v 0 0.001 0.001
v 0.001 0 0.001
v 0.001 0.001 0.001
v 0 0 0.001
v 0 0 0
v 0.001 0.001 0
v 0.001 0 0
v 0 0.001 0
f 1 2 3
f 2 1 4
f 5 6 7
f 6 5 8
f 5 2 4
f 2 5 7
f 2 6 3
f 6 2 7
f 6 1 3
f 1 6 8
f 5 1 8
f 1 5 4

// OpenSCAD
// t_net — the network layer, as PURE DATA. Nothing here renders, and none of it
// depends on $fa/$fs. This is the tier that catches what "Simple: yes" cannot,
// and every silent failure this design was reviewed against passed "Simple: yes".

// clang-format off
use <../src/uniTube.scad>;
// clang-format on

$fa = 12;
$fs = 2;

prof = ut_round(od = 12, id = 8);
big = ut_round(od = 20, wall = 2);

// ============================================ a wall-landing tee
trunk = ut_run("trunk", ut_polyline([ [ -50, 0, 0 ], [ 50, 0, 0 ] ]), big);
branch = ut_run("branch", ut_polyline([ [ 0, 10, 0 ], [ 0, 50, 0 ] ]), prof);
tee = ut_net([ trunk, branch ], [ut_joint([ [ "trunk", [ "s", 50 ] ], [ "branch", "a" ] ])]);

// --- ports are DERIVED FROM GRAPH DEGREE, never declared ---------------------
// A joint-incident end is not a port, so "which ends are open?" is a computed
// fact rather than user bookkeeping.
names = [for (p = ut_ports(tee)) ut_port_name(p)];
assert(len(names) == 3, str("a tee has 3 open ends, got ", len(names), ": ", names));
assert(len([for (n = names) if (n == "branch.a") 1]) == 0, "branch.a is joint-incident and must NOT be a port");
assert(len([for (n = names) if (n == "branch.b") 1]) == 1, "branch.b is open");

// A port still carries a full FRAME, and its direction is OUTWARD.
pb = ut_port_named(tee, "branch.b");
assert(norm(ut_port_pos(pb) - [ 0, 50, 0 ]) < 1e-9, "port position");
assert(norm(ut_port_dir(pb) - [ 0, 1, 0 ]) < 1e-12, "port dir points OUTWARD, exactly");
assert(abs(norm(ut_port_normal(pb)) - 1) < 1e-9, "port carries a unit roll reference");

// --- the joint node sits on the trunk CENTRELINE, not on its wall ------------
// This is the whole reason a mid-run landing is expressible: the node must be
// somewhere the branch bore can be aimed at.
j = ut_net_joints(tee)[0];
node = ut_joint_node(tee, j);
assert(norm(node - [ 0, 0, 0 ]) < 1e-9, str("mid-run landing puts the node on the trunk axis, got ", node));

// --- the joint's two radii are MEASURED from the incident profiles -----------
assert(abs(ut_joint_shell_r(tee, j) - 10) < 1e-9, "shell radius = the farthest incident outer reach (trunk od/2)");
core = ut_joint_core_r(tee, j);
assert(core > 3.9 && core < 4.0, str("core radius = the smallest incident bore inradius (~4), got ", core));
assert(core < ut_joint_shell_r(tee, j), "NET-4: the ball must have a wall");

// --- BOTH shell and bore are extended into the joint -------------------------
// Extending only the bore leaves the shells touching TANGENTIALLY: measured,
// `Simple: yes, Volumes: 3` -- two solids sharing a circle.
sh = _ut_run_stations(tee, branch, "shell");
bo = _ut_run_stations(tee, branch, "bore");
base = ut_stations(ut_run_path(branch));
assert(len(sh) == len(base) + 1, "the shell gains one station at the joint-incident end");
assert(len(bo) == len(base) + 1, "so does the bore");
// The shell reaches the node; the bore goes half a core-radius further.
assert(norm(ut_st_p(sh[0]) - node) < 1e-6, str("shell extension reaches the node, got ", ut_st_p(sh[0])));
assert(norm(ut_st_p(bo[0]) - node) - core / 2 < 1e-6, "bore extension passes the node by half a core radius");
// The extension is COLLINEAR, so it cannot disturb the frame.
assert(ut_turn(ut_st_t(sh[0]), ut_st_t(base[0])) < 1e-9, "extension shares the end tangent exactly");
assert(norm(ut_st_n(sh[0]) - ut_st_n(base[0])) < 1e-9, "and the end roll reference");

// --- the open end is NOT extended -------------------------------------------
assert(norm(ut_st_p(sh[len(sh) - 1]) - [ 0, 50, 0 ]) < 1e-9, "a port end is left exactly where the path put it");

// ============================================ lumen groups
path = ut_polyline([ [ 0, 0, 0 ], [ 60, 0, 0 ], [ 60, 50, 0 ] ], r = 20);
jack = ut_net([
    ut_run("jacket", path, ut_round(od = 30, id = 26), group = 0),
    ut_run("liner", path, ut_round(od = 12, id = 8), group = 1),
]);
assert(len(ut_groups(jack)) == 2, "two lumen groups");
assert(ut_check_net(jack), "a correctly grouped jacket validates");
// Every end is open: no joints, so four ports.
assert(len(ut_ports(jack)) == 4, "a jacket has four open ends");

// ============================================ the 4-into-1 manifold
N = 4;
branches = [for (i = [0:N - 1]) let(th = 360 * i / N) ut_run(
    str("in", i),
    ut_polyline([ [ 50 * cos(th), 50 * sin(th), -55 ], [ 50 * cos(th), 50 * sin(th), -25 ], [ 0, 0, 0 ] ], r = 15),
    prof)];
man = ut_net(concat(branches, [ut_run("out", ut_polyline([ [ 0, 0, 0 ], [ 0, 0, 55 ] ]), ut_round(od = 16, id = 12))]),
             [ut_joint(concat([for (i = [0:N - 1])[str("in", i), "b"]], [[ "out", "a" ]]), at = [ 0, 0, 0 ])]);

assert(ut_check_net(man), "the manifold validates");
mp = [for (p = ut_ports(man)) ut_port_name(p)];
assert(len(mp) == 5, str("the manifold has exactly 5 open ends, got ", len(mp), ": ", mp));
assert(len([for (n = mp) if (n == "out.b") 1]) == 1, "the outlet is open");
assert(len([for (n = mp) if (n == "in0.b") 1]) == 0, "every inlet's joint end is consumed by the joint");
// Five runs meet at one node, and every one of them is extended to reach it.
mj = ut_net_joints(man)[0];
assert(len(ut_joint_incident(mj)) == 5, "five incident ends");
assert(abs(ut_joint_shell_r(man, mj) - 8) < 1e-9, "shell radius = the trunk's od/2, the largest incident reach");

// ============================================ the port frame IS the swept frame
// ut_ports() used to call _ut_end_station with the DEFAULT opts, while
// ut_assemble sweeps with concat(opts, ut_run_opts(r)). Measured before the fix:
// a run carrying opts=[["twist",90]] reported a port normal 90 degrees from the
// geometry it would be bolted to -- silently, exit 0. A port carrying a FRAME
// rather than a diameter is the entire premise of ADR 0005.
tw = ut_run("tw", ut_polyline([ [ 0, 0, 0 ], [ 60, 0, 0 ] ]), prof, opts = [[ "twist", 90 ]]);
twnet = ut_net([tw]);
pb2 = ut_port_named(twnet, "tw.b");
swept = ut_stations(ut_polyline([ [ 0, 0, 0 ], [ 60, 0, 0 ] ]), [[ "twist", 90 ]]);
assert(ut_turn(ut_port_normal(pb2), ut_st_n(swept[len(swept) - 1])) < 1e-9,
       str("the port frame must equal the frame actually swept; skew was ",
           ut_turn(ut_port_normal(pb2), ut_st_n(swept[len(swept) - 1])), " deg"));

cube(0.001); // sentinel
